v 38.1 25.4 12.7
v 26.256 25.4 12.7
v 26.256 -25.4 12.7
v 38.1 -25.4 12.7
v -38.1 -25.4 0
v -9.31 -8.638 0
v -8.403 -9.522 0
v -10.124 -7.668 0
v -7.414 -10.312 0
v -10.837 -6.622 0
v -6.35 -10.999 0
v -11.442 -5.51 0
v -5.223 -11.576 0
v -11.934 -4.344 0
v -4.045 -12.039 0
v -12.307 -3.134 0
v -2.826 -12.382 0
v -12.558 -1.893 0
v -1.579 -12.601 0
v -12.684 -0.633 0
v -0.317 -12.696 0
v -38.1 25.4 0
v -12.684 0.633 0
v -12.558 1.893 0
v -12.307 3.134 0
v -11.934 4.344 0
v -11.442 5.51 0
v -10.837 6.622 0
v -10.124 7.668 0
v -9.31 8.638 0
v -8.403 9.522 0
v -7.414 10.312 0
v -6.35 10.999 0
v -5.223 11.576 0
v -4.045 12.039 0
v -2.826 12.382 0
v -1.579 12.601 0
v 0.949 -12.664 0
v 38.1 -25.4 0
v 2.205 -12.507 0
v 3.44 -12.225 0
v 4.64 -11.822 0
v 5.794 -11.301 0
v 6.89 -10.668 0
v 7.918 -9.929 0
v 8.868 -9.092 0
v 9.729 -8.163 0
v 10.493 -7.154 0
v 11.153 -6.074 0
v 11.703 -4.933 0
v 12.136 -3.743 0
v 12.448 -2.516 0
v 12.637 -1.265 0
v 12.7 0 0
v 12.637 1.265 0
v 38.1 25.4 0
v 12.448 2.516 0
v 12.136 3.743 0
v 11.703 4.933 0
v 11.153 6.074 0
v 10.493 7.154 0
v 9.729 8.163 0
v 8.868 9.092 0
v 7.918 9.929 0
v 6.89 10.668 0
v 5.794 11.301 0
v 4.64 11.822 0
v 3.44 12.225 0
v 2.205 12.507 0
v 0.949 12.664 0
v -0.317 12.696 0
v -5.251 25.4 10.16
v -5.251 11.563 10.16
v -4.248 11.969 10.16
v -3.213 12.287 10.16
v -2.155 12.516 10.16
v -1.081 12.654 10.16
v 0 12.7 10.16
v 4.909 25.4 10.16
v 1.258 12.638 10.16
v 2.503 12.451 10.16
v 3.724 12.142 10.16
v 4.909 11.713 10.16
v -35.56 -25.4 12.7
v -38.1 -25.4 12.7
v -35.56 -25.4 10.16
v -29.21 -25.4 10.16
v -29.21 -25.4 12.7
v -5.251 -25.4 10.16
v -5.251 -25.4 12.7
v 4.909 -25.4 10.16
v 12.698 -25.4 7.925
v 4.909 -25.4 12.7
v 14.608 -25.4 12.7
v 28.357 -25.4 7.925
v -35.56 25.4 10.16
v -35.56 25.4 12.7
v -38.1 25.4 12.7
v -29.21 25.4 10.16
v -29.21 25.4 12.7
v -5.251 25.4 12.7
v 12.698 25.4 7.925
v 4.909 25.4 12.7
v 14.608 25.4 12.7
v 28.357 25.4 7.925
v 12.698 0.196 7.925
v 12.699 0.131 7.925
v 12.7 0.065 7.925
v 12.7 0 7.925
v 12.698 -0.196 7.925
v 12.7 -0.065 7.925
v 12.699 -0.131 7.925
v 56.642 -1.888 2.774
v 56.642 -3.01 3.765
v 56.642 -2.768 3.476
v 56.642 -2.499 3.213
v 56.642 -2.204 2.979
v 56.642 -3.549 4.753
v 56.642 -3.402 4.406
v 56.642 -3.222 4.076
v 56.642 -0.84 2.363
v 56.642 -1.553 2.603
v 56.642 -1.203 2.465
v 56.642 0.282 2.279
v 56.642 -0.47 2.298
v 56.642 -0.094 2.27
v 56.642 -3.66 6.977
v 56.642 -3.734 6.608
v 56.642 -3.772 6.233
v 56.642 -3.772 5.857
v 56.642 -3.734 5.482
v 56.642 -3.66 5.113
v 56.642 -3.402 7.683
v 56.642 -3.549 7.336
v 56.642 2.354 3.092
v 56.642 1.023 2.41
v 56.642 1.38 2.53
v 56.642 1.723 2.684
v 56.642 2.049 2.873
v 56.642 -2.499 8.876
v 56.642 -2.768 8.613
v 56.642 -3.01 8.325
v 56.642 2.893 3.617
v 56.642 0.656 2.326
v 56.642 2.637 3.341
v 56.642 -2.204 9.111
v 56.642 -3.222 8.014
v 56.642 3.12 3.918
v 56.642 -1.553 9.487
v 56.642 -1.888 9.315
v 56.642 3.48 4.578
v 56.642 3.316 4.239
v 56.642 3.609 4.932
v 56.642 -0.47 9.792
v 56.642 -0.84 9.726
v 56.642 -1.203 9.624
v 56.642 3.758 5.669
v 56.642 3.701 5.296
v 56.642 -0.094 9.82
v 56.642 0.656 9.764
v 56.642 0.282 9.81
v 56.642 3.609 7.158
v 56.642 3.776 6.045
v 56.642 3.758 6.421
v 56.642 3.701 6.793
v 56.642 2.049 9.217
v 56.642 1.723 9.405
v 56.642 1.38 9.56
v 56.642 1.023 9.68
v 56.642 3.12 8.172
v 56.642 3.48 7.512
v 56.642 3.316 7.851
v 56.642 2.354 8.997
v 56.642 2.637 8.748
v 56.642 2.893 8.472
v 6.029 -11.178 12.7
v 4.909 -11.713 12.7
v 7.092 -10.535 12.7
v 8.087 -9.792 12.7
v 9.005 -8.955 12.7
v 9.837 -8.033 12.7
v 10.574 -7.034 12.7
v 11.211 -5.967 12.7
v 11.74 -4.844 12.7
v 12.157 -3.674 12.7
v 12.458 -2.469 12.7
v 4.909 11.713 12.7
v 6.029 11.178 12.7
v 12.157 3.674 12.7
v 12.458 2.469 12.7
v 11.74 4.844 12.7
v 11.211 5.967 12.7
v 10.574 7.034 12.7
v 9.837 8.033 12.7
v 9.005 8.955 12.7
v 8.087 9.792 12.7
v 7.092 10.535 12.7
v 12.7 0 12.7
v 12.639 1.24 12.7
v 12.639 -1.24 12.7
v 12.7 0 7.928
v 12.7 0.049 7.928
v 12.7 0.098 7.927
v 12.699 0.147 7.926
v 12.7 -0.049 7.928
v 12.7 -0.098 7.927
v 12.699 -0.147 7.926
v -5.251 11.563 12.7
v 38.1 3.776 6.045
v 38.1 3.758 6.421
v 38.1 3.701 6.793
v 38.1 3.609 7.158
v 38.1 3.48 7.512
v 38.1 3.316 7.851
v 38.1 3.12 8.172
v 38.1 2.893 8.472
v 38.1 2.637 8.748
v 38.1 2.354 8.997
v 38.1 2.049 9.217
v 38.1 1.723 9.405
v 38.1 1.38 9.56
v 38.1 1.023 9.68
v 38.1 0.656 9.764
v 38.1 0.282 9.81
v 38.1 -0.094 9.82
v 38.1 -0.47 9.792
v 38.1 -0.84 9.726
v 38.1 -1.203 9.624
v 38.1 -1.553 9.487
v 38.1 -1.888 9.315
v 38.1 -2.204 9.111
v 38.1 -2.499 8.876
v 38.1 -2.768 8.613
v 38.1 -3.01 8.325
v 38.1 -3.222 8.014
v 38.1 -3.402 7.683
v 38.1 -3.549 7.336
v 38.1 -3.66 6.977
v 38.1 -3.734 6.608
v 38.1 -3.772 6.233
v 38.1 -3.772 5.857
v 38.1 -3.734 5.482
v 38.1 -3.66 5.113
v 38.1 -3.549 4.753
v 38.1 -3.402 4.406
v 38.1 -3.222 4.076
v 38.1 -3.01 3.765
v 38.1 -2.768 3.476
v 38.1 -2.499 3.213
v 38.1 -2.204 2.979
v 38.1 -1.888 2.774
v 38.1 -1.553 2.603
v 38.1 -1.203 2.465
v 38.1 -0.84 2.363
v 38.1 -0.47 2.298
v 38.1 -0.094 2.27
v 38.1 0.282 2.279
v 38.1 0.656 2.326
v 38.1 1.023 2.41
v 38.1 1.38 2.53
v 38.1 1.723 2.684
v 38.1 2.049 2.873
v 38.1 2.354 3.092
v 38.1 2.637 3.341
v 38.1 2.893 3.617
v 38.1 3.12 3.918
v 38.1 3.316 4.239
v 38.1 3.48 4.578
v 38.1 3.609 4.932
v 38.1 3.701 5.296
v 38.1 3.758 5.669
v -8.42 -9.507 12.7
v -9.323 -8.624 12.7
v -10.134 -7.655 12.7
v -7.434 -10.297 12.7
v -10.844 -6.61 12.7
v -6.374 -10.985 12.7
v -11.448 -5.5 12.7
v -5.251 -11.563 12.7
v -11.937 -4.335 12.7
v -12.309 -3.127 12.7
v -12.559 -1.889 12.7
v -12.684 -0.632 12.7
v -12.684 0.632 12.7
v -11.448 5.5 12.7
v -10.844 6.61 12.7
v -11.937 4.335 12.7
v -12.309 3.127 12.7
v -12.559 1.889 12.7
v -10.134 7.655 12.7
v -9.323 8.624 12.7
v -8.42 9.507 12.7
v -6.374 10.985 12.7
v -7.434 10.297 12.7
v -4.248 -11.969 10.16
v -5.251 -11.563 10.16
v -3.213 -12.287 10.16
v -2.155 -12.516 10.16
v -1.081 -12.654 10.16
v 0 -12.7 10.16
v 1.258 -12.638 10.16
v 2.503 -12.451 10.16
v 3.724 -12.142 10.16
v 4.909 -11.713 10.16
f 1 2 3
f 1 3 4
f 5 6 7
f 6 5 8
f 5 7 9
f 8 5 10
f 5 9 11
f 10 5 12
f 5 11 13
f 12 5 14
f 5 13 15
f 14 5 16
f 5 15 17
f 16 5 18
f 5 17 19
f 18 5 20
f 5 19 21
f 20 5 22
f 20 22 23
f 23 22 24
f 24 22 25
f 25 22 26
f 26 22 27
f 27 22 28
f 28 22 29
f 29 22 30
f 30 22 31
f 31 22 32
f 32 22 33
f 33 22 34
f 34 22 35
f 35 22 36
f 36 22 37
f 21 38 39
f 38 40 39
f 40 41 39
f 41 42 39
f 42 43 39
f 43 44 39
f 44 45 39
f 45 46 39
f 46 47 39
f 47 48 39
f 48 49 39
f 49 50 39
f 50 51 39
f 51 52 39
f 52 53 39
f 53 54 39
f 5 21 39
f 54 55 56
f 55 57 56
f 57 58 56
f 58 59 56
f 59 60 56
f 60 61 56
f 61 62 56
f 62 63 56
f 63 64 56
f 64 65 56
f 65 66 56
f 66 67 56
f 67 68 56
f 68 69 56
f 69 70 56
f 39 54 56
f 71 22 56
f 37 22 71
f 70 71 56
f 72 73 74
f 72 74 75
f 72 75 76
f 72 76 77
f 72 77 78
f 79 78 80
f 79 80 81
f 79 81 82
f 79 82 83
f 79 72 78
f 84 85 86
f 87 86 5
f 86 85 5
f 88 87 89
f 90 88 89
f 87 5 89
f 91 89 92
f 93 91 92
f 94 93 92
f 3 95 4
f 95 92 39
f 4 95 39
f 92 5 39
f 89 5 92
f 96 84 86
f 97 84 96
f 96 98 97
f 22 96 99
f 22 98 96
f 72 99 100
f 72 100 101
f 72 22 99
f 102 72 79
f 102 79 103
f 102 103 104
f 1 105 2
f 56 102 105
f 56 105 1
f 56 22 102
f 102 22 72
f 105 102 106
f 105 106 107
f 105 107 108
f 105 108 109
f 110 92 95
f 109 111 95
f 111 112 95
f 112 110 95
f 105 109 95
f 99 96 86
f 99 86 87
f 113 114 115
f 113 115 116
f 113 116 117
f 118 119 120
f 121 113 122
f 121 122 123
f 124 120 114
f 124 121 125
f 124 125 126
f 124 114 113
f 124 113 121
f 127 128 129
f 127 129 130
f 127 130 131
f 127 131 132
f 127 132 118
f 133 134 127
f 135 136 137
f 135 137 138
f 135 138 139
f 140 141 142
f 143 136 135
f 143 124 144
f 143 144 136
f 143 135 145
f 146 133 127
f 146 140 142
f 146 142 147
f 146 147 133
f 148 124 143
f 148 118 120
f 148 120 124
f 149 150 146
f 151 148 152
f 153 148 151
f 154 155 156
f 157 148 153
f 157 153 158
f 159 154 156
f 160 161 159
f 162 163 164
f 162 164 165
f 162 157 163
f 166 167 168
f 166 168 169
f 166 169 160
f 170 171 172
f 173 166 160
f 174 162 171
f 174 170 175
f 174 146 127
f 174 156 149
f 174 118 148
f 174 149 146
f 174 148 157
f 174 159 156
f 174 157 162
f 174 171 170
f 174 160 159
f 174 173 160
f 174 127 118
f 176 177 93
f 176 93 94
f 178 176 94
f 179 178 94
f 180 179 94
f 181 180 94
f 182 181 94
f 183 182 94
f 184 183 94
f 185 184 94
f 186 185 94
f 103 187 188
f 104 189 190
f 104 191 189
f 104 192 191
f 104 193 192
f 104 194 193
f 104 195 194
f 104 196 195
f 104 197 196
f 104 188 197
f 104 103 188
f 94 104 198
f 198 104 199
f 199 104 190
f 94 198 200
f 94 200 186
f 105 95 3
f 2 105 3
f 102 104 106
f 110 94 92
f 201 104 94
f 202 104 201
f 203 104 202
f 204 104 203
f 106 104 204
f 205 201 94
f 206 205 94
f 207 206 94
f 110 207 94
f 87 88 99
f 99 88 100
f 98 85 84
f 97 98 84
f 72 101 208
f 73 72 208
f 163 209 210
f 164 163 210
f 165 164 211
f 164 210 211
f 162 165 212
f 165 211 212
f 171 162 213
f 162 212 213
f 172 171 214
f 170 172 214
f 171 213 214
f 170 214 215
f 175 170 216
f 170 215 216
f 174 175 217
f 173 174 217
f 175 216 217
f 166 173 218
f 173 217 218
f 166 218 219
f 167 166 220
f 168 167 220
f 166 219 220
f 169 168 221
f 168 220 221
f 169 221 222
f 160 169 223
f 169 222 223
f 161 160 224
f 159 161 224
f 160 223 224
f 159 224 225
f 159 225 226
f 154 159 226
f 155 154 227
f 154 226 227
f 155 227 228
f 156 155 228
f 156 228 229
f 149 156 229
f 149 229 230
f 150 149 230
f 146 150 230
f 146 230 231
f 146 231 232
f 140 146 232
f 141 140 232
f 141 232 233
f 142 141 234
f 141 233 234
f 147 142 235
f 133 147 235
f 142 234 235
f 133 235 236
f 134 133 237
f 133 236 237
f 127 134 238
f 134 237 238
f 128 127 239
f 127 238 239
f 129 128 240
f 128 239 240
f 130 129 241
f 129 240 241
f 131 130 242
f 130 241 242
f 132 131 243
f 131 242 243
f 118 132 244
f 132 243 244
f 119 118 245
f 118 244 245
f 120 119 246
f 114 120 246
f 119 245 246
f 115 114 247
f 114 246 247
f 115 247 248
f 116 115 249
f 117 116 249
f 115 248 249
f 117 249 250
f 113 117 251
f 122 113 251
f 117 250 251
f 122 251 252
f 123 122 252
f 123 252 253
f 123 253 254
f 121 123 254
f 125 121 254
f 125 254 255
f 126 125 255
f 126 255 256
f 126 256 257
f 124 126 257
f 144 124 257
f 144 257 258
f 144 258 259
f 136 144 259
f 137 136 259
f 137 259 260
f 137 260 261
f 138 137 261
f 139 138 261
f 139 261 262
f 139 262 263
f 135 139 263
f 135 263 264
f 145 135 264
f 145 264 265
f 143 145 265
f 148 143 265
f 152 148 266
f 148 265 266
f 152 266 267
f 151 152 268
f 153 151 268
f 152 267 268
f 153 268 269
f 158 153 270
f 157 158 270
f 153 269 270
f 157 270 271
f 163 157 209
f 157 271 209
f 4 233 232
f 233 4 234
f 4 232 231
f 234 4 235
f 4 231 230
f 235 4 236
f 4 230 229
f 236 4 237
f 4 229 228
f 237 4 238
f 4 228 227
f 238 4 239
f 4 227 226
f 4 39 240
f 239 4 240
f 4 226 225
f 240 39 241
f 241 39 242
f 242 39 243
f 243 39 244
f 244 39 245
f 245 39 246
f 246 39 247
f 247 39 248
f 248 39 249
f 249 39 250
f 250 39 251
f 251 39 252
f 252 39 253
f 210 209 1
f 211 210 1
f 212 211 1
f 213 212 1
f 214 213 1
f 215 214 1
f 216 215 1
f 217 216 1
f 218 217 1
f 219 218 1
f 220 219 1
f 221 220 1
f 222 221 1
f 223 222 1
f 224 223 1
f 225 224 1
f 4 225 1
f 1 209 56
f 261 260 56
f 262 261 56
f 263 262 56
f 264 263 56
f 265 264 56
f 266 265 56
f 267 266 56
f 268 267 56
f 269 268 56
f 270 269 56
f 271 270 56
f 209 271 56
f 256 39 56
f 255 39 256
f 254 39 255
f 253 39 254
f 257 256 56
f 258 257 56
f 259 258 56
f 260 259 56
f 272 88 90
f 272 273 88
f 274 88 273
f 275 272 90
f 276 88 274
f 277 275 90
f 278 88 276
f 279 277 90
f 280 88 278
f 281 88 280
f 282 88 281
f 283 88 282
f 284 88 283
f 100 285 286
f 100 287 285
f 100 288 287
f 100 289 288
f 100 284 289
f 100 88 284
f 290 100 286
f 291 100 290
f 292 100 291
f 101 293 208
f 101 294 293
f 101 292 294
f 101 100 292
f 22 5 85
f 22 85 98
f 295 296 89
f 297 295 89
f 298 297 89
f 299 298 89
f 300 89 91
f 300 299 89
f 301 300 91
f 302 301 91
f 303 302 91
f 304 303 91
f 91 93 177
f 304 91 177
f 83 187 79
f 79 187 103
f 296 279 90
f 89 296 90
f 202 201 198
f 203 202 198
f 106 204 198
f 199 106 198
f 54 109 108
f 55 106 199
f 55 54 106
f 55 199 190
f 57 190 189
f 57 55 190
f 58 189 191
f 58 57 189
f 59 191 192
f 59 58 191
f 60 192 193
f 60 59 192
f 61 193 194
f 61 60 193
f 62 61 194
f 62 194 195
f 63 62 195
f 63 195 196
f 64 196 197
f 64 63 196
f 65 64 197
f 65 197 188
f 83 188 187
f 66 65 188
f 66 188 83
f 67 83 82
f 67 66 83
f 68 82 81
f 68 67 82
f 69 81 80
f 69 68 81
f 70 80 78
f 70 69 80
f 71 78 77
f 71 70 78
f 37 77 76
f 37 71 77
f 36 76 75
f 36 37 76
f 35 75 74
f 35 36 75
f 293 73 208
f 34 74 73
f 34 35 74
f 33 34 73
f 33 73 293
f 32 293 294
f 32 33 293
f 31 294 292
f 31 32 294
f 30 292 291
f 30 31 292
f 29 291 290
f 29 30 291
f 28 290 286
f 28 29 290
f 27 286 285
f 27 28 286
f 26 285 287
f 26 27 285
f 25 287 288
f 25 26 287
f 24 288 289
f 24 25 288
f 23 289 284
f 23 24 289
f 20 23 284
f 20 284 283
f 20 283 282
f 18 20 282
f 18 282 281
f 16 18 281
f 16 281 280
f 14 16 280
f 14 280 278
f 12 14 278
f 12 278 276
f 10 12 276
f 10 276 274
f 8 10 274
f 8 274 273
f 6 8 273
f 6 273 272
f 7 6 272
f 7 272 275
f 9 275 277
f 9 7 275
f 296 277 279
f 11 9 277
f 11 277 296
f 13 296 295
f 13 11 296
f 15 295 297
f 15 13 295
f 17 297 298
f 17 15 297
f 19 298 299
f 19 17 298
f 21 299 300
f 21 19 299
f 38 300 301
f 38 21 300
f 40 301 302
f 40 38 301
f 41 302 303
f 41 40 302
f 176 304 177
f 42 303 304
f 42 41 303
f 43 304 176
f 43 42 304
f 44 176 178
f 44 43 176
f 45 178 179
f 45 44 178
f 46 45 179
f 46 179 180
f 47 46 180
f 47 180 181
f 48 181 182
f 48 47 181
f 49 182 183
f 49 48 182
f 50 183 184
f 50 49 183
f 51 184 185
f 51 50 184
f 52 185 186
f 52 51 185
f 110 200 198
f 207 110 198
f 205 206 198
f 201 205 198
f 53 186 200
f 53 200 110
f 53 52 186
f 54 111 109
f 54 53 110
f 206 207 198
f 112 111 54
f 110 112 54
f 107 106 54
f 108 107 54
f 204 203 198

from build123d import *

# Parameters (mm, degrees)
F0_W     = 76.2
F0_H     = 50.8
F0_R     = 12.7
F1_DEPTH = 12.7
F2_W     = 6.35
F2_H     = 50.8
F3_DEPTH = 2.54
F4_R     = 3.776277
F5_DEPTH = 18.542
F7_DEPTH = 50.801


with BuildPart() as f1:
    # F0 (on Top) → F1 (new body)
    with BuildSketch(Plane.XY):
        Rectangle(F0_W, F0_H)
        Circle(F0_R, mode=Mode.SUBTRACT)
    extrude(amount=F1_DEPTH)

    # F2 (on face) → F3 (cut)
    with BuildSketch(Plane.XY.offset(12.7)):
        with Locations((-32.385, 0)):
            Rectangle(F2_W, F2_H)
        with BuildLine():
            Line((-5.251254, -11.563491), (-5.251254, -25.4))
            Line((-5.251254, -25.4), (0, -25.4))
            Line((0, -25.4), (0, -12.7))
            ThreePointArc((0, -12.7), (-2.686416, -12.412621), (-5.251254, -11.563491))
        make_face()
        with BuildLine():
            Line((0, -12.7), (0, -25.4))
            Line((0, -25.4), (4.908746, -25.4))
            Line((4.908746, -25.4), (4.908746, -11.712993))
            ThreePointArc((4.908746, -11.712993), (2.503496, -12.450803), (0, -12.7))
        make_face()
        with BuildLine():
            Line((0, 25.4), (-5.251254, 25.4))
            Line((-5.251254, 25.4), (-5.251254, 11.563491))
            ThreePointArc((-5.251254, 11.563491), (-2.686416, 12.412621), (0, 12.7))
            Line((0, 12.7), (0, 25.4))
        make_face()
        with BuildLine():
            Line((4.908746, 25.4), (0, 25.4))
            Line((0, 25.4), (0, 12.7))
            ThreePointArc((0, 12.7), (2.503496, 12.450803), (4.908746, 11.712993))
            Line((4.908746, 11.712993), (4.908746, 25.4))
        make_face()
    extrude(amount=-F3_DEPTH, mode=Mode.SUBTRACT)

    # F4 (on face) → F5 (join)
    with BuildSketch(Plane.YZ.offset(38.1)):
        with Locations((0, 6.044753)):
            Circle(F4_R)
    extrude(amount=F5_DEPTH)

    # F6 (on face) → F7 (cut, through all)
    with BuildSketch(Plane.XZ.offset(25.4)):
        Polygon((26.256265, 12.7), (14.608031, 12.7), (12.698486, 7.924618), (28.356764, 7.924618), align=None)
    extrude(amount=-F7_DEPTH, mode=Mode.SUBTRACT)


solid = f1.part
